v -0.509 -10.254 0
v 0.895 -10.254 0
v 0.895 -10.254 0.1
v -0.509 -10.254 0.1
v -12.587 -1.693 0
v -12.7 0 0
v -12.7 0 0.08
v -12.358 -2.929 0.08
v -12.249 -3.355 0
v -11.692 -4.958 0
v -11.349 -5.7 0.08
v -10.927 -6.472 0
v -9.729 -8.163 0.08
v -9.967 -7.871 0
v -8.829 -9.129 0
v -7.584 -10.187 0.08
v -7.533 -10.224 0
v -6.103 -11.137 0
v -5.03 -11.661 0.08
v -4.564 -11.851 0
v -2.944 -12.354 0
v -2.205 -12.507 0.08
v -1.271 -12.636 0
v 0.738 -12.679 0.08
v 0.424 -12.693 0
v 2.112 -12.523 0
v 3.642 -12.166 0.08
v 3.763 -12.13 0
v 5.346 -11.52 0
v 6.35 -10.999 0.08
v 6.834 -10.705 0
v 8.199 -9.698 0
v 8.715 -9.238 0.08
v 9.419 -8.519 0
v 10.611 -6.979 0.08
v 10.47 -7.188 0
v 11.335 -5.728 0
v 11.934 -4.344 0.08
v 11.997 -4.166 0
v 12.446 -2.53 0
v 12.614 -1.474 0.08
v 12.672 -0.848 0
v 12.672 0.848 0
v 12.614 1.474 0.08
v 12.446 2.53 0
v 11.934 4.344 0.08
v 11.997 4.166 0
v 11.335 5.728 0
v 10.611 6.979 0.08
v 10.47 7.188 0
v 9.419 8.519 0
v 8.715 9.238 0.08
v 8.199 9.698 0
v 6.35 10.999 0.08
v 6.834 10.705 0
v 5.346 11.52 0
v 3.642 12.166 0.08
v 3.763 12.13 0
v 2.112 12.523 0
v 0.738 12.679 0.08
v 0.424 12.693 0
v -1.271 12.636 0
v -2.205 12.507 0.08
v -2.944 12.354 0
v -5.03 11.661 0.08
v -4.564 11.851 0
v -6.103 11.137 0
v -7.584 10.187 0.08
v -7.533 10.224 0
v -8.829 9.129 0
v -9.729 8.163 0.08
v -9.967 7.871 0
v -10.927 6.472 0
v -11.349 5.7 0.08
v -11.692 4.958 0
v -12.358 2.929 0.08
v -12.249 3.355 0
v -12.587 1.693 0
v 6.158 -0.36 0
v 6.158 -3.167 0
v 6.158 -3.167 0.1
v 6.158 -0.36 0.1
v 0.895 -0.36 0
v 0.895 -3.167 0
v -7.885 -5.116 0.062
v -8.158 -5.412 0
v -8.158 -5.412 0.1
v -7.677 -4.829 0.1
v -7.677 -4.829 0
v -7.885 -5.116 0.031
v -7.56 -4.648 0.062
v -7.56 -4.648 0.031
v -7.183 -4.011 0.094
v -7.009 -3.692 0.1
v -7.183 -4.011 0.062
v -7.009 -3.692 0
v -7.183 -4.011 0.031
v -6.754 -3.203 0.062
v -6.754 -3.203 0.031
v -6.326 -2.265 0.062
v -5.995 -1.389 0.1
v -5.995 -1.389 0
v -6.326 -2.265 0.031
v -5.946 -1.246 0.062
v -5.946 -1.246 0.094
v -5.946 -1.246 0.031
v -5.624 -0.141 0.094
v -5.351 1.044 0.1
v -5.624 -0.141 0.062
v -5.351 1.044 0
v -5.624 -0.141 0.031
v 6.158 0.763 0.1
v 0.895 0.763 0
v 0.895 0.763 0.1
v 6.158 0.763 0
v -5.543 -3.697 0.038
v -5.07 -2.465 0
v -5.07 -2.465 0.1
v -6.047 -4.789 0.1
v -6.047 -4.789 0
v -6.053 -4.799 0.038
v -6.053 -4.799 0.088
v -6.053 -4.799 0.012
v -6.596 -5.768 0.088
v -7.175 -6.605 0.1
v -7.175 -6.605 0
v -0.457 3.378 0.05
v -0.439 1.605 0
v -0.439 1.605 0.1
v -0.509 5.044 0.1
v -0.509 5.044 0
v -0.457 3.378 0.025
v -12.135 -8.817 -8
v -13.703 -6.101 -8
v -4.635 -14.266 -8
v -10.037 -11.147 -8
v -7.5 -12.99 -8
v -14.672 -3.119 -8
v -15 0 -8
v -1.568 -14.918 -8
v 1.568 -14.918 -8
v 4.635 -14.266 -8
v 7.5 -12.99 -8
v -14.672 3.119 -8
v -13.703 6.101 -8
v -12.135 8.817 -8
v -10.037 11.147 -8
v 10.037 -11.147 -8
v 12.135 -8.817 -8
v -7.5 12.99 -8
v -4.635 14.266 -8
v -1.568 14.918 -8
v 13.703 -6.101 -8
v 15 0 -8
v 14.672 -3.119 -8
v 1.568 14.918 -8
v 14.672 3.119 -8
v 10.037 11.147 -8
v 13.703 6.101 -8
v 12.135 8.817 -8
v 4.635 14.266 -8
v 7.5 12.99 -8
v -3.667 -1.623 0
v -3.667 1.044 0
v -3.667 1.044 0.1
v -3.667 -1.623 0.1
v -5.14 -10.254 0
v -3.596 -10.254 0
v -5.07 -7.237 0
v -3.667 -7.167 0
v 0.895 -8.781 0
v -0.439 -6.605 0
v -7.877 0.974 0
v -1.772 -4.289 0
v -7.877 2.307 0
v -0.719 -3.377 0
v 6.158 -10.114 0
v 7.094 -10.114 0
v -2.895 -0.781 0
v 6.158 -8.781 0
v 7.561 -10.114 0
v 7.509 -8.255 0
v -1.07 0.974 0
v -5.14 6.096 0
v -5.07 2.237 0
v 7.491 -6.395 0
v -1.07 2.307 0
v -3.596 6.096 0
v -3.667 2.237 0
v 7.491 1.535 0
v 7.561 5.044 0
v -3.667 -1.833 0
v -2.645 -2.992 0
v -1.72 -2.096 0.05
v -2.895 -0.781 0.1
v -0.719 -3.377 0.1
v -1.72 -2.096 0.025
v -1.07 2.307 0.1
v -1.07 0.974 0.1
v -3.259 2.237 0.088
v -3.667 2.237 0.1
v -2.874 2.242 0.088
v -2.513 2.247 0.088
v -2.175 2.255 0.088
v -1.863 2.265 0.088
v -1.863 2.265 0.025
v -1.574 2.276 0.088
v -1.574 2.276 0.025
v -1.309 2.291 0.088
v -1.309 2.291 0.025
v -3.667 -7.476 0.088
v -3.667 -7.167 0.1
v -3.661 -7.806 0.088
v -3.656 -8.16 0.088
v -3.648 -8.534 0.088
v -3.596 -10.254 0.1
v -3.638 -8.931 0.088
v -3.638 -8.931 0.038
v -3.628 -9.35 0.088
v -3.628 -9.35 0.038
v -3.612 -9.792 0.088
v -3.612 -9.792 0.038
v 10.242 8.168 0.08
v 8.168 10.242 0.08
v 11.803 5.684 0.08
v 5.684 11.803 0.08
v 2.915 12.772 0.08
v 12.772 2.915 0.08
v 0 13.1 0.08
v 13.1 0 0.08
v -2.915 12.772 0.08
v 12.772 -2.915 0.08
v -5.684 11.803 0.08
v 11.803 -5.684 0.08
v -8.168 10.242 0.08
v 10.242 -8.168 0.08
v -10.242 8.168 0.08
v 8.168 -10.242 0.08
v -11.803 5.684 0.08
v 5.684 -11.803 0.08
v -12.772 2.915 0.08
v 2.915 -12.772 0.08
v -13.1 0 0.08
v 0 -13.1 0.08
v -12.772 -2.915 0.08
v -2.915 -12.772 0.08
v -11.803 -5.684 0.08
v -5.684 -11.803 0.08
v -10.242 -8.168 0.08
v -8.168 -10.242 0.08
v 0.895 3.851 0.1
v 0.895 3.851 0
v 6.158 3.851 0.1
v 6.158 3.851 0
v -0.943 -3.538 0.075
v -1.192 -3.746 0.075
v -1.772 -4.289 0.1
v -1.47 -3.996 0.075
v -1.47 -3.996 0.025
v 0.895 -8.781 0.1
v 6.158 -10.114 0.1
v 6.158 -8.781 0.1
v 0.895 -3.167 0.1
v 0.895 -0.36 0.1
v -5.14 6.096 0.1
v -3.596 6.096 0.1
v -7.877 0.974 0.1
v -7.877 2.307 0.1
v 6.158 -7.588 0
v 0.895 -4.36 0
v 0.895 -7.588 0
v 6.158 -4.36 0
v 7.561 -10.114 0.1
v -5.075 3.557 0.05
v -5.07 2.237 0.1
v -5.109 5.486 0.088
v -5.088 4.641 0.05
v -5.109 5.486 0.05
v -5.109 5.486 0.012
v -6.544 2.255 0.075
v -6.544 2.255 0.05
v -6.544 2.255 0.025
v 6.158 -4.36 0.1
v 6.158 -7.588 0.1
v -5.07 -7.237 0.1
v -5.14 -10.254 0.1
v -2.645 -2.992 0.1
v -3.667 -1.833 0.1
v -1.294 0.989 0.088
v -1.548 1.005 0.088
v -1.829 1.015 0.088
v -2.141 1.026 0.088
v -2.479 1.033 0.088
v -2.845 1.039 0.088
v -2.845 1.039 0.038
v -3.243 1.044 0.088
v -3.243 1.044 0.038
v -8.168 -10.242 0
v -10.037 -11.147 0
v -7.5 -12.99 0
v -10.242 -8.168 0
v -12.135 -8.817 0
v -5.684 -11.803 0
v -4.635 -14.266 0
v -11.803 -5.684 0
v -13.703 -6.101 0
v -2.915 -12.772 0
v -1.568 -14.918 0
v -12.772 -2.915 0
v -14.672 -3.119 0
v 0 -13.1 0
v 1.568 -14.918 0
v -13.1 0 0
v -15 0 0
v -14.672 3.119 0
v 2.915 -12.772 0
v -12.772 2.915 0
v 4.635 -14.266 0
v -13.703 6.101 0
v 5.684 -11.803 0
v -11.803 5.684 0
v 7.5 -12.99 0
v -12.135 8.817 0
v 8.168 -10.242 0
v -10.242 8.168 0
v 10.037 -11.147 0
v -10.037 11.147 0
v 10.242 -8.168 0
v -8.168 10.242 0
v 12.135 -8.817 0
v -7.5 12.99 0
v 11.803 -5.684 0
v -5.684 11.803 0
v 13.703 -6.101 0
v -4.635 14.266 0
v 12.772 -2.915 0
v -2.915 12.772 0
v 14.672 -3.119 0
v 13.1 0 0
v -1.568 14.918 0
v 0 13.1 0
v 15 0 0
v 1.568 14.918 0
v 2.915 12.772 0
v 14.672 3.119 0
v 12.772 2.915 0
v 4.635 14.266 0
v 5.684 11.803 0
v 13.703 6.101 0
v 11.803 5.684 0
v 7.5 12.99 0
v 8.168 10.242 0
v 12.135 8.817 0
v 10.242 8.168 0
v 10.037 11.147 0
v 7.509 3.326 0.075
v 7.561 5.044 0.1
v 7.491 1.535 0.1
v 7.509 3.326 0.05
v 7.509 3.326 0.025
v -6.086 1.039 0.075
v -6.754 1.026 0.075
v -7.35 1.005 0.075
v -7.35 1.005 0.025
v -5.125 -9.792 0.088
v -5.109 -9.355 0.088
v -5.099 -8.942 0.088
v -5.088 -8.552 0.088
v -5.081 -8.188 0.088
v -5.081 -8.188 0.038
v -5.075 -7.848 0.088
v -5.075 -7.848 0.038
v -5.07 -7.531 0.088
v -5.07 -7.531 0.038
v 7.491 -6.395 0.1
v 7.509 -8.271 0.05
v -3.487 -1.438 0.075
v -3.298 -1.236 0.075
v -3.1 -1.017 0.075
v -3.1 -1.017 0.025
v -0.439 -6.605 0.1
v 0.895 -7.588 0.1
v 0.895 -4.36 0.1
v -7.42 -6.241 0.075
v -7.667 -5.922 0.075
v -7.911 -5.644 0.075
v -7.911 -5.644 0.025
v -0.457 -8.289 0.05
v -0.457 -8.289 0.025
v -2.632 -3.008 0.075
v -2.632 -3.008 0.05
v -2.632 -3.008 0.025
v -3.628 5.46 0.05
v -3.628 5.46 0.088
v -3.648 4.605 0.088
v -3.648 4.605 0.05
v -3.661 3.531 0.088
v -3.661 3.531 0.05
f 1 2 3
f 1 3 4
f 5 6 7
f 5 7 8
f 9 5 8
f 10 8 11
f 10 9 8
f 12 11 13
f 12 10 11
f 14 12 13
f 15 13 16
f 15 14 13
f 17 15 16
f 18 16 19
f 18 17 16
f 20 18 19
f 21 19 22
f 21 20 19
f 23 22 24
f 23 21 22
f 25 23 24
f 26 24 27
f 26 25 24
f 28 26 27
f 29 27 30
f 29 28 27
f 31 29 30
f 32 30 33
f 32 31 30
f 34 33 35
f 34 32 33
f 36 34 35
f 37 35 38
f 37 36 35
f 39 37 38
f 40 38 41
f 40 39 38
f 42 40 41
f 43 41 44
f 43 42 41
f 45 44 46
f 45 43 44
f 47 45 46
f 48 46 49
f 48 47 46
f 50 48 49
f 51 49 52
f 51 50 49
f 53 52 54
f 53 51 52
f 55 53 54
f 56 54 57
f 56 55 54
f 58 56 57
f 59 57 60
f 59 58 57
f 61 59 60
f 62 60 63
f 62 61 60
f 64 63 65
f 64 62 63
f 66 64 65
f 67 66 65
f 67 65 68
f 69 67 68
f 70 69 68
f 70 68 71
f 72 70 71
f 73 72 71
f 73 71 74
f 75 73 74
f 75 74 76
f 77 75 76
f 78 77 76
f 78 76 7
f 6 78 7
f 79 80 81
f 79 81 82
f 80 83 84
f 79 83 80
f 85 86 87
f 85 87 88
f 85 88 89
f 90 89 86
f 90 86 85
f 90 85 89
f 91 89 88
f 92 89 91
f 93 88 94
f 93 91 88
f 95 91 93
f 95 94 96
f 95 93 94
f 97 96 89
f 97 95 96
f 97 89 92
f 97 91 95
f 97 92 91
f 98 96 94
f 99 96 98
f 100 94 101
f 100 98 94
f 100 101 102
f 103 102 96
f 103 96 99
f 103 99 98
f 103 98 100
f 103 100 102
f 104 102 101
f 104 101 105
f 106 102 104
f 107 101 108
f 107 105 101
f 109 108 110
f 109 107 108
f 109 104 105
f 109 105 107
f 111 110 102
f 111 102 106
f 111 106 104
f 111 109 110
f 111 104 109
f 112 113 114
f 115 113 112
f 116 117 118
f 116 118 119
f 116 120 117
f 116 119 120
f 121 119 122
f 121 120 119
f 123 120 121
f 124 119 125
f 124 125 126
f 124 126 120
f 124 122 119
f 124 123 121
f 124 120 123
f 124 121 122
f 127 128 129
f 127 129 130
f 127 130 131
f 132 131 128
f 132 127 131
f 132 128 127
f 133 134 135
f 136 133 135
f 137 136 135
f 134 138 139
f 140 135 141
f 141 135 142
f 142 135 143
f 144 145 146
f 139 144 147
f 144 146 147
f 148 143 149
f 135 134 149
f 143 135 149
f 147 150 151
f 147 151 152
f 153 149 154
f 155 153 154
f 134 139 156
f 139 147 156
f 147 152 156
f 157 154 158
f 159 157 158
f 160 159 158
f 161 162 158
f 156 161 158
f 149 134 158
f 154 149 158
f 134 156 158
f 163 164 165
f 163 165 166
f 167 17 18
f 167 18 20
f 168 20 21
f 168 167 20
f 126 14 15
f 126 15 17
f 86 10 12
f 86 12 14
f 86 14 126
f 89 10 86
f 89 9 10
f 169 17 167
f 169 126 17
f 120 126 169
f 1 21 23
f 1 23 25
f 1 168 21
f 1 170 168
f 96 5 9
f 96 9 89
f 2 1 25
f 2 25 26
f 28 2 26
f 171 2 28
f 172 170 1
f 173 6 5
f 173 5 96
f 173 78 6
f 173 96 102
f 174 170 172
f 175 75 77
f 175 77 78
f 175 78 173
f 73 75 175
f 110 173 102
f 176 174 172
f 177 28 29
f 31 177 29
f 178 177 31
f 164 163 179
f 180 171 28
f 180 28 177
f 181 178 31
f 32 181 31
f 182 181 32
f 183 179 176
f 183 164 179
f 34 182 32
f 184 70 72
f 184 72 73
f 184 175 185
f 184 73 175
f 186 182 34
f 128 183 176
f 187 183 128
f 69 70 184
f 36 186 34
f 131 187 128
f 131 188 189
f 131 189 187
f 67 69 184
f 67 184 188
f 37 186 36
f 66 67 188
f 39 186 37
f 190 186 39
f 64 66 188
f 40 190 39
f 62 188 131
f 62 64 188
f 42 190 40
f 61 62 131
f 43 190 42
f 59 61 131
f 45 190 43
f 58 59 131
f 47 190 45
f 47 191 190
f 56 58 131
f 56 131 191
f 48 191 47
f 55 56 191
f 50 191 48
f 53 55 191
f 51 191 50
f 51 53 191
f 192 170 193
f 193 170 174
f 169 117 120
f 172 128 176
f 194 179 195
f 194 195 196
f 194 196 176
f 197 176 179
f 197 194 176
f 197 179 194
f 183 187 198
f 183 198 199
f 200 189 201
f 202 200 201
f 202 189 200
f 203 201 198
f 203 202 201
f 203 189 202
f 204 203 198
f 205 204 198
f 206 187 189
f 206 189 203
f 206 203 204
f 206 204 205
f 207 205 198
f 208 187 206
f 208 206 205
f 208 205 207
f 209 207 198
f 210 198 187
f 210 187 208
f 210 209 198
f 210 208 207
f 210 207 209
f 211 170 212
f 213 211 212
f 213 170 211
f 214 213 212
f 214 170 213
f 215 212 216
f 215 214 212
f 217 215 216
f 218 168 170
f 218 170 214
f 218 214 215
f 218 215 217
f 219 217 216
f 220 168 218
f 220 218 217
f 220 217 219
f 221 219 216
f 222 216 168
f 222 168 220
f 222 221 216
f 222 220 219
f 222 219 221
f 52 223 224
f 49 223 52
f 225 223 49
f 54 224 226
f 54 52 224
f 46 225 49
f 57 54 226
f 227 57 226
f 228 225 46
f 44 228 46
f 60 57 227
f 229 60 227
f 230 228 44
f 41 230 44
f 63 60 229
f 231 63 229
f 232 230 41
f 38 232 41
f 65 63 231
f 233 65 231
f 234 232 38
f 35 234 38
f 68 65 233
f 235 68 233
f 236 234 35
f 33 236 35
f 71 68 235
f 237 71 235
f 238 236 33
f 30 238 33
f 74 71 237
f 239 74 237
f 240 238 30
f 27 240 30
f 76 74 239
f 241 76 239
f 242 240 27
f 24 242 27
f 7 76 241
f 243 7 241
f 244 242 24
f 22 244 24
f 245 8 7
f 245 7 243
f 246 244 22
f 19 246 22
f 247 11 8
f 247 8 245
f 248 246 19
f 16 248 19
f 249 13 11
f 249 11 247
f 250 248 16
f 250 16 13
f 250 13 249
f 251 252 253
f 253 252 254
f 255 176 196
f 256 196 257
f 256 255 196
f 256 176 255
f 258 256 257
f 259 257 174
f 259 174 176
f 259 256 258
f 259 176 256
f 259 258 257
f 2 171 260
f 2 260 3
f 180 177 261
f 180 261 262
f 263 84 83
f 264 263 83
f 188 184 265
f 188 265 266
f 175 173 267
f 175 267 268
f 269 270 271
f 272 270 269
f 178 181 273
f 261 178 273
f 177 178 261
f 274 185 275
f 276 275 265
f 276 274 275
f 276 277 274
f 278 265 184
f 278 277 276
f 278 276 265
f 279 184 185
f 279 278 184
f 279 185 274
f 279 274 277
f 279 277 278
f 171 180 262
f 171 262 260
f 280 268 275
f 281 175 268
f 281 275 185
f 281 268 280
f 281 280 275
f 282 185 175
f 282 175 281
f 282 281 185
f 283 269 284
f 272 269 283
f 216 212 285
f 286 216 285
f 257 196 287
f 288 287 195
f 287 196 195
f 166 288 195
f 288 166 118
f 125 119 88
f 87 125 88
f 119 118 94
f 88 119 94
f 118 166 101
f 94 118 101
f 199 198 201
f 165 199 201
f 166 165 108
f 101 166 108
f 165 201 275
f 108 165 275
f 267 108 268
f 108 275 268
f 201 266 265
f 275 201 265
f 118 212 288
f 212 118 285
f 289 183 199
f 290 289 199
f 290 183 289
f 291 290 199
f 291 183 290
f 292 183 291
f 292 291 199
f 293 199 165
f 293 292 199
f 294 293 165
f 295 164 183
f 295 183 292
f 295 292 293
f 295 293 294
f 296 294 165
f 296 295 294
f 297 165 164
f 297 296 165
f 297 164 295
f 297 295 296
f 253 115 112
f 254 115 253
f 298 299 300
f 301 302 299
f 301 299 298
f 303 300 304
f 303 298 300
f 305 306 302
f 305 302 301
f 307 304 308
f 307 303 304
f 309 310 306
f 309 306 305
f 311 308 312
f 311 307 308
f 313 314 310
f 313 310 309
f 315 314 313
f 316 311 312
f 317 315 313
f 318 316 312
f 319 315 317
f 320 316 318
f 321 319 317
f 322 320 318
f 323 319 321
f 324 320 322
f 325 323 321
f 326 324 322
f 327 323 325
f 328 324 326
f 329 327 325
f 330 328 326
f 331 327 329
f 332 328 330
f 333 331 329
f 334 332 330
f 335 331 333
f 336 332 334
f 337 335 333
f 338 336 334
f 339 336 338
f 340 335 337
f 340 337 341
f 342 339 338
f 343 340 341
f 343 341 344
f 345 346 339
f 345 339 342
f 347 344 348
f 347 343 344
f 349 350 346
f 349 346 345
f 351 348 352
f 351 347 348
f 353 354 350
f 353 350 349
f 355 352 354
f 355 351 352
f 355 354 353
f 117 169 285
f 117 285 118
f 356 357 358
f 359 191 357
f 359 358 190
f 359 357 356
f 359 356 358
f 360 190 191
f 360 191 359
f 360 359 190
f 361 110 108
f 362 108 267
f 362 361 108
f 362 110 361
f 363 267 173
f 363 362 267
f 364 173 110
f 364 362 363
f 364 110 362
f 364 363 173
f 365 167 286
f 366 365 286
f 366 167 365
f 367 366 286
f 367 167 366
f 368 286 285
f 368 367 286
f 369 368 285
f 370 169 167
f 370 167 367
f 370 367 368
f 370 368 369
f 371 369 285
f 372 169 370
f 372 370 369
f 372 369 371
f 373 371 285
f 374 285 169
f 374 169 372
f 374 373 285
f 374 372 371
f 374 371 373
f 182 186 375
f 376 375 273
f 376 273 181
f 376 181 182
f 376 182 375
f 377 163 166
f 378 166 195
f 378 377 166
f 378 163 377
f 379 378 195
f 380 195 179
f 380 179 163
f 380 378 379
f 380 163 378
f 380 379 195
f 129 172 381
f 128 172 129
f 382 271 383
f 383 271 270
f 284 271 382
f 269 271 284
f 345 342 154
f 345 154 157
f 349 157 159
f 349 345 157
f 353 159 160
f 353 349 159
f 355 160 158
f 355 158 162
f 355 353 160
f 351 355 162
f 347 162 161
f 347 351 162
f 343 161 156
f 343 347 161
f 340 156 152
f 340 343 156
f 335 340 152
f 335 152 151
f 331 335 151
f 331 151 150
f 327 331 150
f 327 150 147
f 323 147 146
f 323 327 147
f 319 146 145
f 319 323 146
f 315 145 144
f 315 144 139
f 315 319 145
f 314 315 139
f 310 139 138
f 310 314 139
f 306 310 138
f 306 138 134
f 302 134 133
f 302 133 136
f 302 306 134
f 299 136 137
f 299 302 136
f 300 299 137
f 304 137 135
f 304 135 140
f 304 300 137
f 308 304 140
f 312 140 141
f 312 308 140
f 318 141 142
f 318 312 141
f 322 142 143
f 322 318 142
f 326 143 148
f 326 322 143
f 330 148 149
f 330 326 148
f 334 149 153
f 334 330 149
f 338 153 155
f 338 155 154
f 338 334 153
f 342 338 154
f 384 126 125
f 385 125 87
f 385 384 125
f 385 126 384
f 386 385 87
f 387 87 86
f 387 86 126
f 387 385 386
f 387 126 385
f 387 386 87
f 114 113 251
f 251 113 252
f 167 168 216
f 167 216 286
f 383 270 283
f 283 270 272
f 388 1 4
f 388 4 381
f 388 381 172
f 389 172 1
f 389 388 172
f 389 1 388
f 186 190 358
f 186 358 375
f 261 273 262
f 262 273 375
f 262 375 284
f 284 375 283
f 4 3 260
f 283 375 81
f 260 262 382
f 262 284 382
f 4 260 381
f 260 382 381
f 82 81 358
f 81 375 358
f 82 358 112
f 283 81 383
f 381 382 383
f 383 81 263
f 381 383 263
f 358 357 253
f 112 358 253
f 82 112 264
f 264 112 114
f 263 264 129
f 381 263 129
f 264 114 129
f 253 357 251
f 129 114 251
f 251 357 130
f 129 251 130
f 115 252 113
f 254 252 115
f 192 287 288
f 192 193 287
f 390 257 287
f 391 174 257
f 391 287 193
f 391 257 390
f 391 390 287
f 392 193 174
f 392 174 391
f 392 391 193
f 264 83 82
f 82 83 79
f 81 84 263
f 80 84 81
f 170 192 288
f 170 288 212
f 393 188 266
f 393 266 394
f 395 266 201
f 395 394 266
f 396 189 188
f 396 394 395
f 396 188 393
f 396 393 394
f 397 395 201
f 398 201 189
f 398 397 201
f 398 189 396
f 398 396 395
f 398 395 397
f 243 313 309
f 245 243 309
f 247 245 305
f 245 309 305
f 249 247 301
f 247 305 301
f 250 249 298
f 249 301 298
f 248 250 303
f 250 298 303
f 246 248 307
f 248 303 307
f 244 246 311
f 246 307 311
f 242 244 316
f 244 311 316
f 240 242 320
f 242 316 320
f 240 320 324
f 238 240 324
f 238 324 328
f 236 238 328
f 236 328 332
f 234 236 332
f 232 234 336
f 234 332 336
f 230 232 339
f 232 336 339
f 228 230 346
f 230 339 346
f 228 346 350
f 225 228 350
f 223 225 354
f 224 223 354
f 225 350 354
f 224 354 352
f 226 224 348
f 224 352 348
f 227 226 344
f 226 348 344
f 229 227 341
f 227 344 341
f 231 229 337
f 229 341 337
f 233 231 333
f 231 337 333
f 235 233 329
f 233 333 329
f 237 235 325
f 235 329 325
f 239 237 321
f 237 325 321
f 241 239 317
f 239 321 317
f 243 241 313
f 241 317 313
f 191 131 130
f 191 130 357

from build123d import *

# Parameters (mm, degrees)
SKETCH_1_R               = 15
DIAMETER30_HEIGHT8_DEPTH = 8
SKETCH_2_W               = 5.263157895
SKETCH_2_H               = 3.228070175
SKETCH_2_H_2             = 3.087719298
SKETCH_2_H_3             = 2.807017544
CHARACTER_DEPTH          = 0.1
SKETCH_3_R               = 13.1
SKETCH_3_R_2             = 12.7
INK_RING_DEPTH           = 0.08


with BuildPart() as part:
    # 草图1 → Diameter30_Height8 (new body)
    with BuildSketch(Plane.XY):
        Circle(SKETCH_1_R)
    extrude(amount=-DIAMETER30_HEIGHT8_DEPTH)

    # 草图2 → Character_相 (add)
    # profile 1 of 2: a face of its own
    with BuildSketch(Plane.XY):
        with BuildLine():
            add(Edge.make_bspline(
                [(7.561403509, 5.043859649), (7.55019112, 4.760584697), (7.527530744, 4.188082503), (7.508340227, 3.319863454), (7.49462205, 2.433550242), (7.492367, 1.83658782), (7.49122807, 1.535087719)],
                knots=[0, 0, 0, 0, 0.969283805, 1.958934606, 2.969145462, 4, 4, 4, 4], degree=3))
            Line((7.49122807, 1.535087719), (7.49122807, -6.394736842))
            add(Edge.make_bspline(
                [(7.49122807, -6.394736842), (7.494373274, -7.020306568), (7.500608133, -8.260397781), (7.541259106, -9.499836795), (7.561403509, -10.114035088)],
                knots=[0, 0, 0, 0, 1.008909215, 2, 2, 2, 2], degree=3))
            Line((7.561403509, -10.114035088), (6.157894737, -10.114035088))
            Line((6.157894737, -10.114035088), (6.157894737, -8.780701754))
            Line((6.157894737, -8.780701754), (0.894736842, -8.780701754))
            Line((0.894736842, -8.780701754), (0.894736842, -10.254385965))
            Line((0.894736842, -10.254385965), (-0.50877193, -10.254385965))
            add(Edge.make_bspline(
                [(-0.50877193, -10.254385965), (-0.497692205, -9.914790058), (-0.476326497, -9.259926631), (-0.456441705, -8.312053821), (-0.44245572, -7.435279895), (-0.439845263, -6.873840554), (-0.438596491, -6.605263158)],
                knots=[0, 0, 0, 0, 1.117081682, 2.154136505, 3.116988825, 4, 4, 4, 4], degree=3))
            Line((-0.438596491, -6.605263158), (-0.438596491, 1.605263158))
            add(Edge.make_bspline(
                [(-0.438596491, 1.605263158), (-0.439728026, 1.905030661), (-0.441958496, 2.495929231), (-0.45560045, 3.368382891), (-0.474798879, 4.214949159), (-0.497552487, 4.770115799), (-0.50877193, 5.043859649)],
                knots=[0, 0, 0, 0, 1.04583296, 2.06153501, 3.044173712, 4, 4, 4, 4], degree=3))
            Line((-0.50877193, 5.043859649), (7.561403509, 5.043859649))
        make_face()
        with Locations((3.52631579, -5.973684211)):
            Rectangle(SKETCH_2_W, SKETCH_2_H, mode=Mode.SUBTRACT)
        with Locations((3.52631579, 2.307017544)):
            Rectangle(SKETCH_2_W, SKETCH_2_H_2, mode=Mode.SUBTRACT)
        with Locations((3.52631579, -1.763157895)):
            Rectangle(SKETCH_2_W, SKETCH_2_H_3, mode=Mode.SUBTRACT)
    # profile 2 of 2: a face of its own
    with BuildSketch(Plane.XY):
        with BuildLine():
            add(Edge.make_bspline(
                [(-5.070175439, 2.236842105), (-5.069643134, 2.466430588), (-5.068622699, 2.906554508), (-5.075570455, 3.53725376), (-5.079714917, 4.10907054), (-5.087055031, 4.62111986), (-5.098673186, 5.0733128), (-5.106736303, 5.466792434), (-5.12325681, 5.801143721), (-5.135036136, 6.004664303), (-5.140350877, 6.096491228)],
                knots=[0, 0, 0, 0, 1.427178642, 2.735918853, 3.920795363, 4.981877593, 5.919216055, 6.732723881, 7.428214742, 8, 8, 8, 8], degree=3))
            Line((-5.140350877, 6.096491228), (-3.596491228, 6.096491228))
            add(Edge.make_bspline(
                [(-3.596491228, 6.096491228), (-3.601779492, 5.999464476), (-3.613344956, 5.787266417), (-3.630069425, 5.441663603), (-3.638095211, 5.041255673), (-3.649732329, 4.586464135), (-3.657106974, 4.077015184), (-3.661264203, 3.512129116), (-3.668208495, 2.892692888), (-3.667194182, 2.461232429), (-3.666666667, 2.236842105)],
                knots=[0, 0, 0, 0, 0.604055621, 1.321073082, 2.150740011, 3.093471638, 4.149178994, 5.317910599, 6.605121521, 8, 8, 8, 8], degree=3))
            add(Edge.make_bspline(
                [(-3.666666667, 2.236842105), (-3.530644111, 2.236328112), (-3.266384763, 2.235329545), (-2.88174296, 2.242348317), (-2.520442081, 2.246480446), (-2.183393026, 2.253960205), (-1.870707533, 2.265624871), (-1.582020196, 2.273807132), (-1.317912922, 2.290824228), (-1.149878443, 2.301807771), (-1.070175439, 2.307017544)],
                knots=[0, 0, 0, 0, 1.256536578, 2.441150545, 3.553740755, 4.59446206, 5.555405596, 6.444361595, 7.262121348, 8, 8, 8, 8], degree=3))
            Line((-1.070175439, 2.307017544), (-1.070175439, 0.973684211))
            add(Edge.make_bspline(
                [(-1.070175439, 0.973684211), (-1.144677854, 0.978928331), (-1.304031085, 0.990144981), (-1.556887974, 1.006935749), (-1.839513589, 1.015234756), (-2.149605268, 1.026721716), (-2.488385884, 1.034270902), (-2.855751381, 1.03840672), (-3.251657288, 1.045376401), (-3.525446035, 1.044375774), (-3.666666667, 1.043859649)],
                knots=[0, 0, 0, 0, 0.689951739, 1.475737907, 2.340680501, 3.301602752, 4.342301003, 5.470871417, 6.695471813, 8, 8, 8, 8], degree=3))
            Line((-3.666666667, 1.043859649), (-3.666666667, -1.622807018))
            add(Edge.make_bspline(
                [(-3.666666667, -1.622807018), (-3.606636203, -1.561535904), (-3.48182972, -1.434150045), (-3.293392102, -1.23182095), (-3.094864807, -1.013455465), (-2.962807273, -0.859869327), (-2.894736842, -0.780701754)],
                knots=[0, 0, 0, 0, 0.900819035, 1.872850031, 2.903538413, 4, 4, 4, 4], degree=3))
            add(Edge.make_bspline(
                [(-2.894736842, -0.780701754), (-2.689573637, -1.00021337), (-2.288105654, -1.429758644), (-1.724253911, -2.085214095), (-1.199061827, -2.727559357), (-0.877018772, -3.163628299), (-0.719298246, -3.377192982)],
                knots=[0, 0, 0, 0, 1.063555414, 2.081189198, 3.060262768, 4, 4, 4, 4], degree=3))
            add(Edge.make_bspline(
                [(-0.719298246, -3.377192982), (-0.794679109, -3.429771468), (-0.958911081, -3.544323996), (-1.205171009, -3.756414434), (-1.484543132, -4.003739185), (-1.672408418, -4.190524428), (-1.771929825, -4.289473684)],
                knots=[0, 0, 0, 0, 0.790186824, 1.721576733, 2.793008042, 4, 4, 4, 4], degree=3))
            add(Edge.make_bspline(
                [(-1.771929825, -4.289473684), (-1.904998341, -4.0700807), (-2.172035646, -3.629810433), (-2.627101337, -3.003052442), (-3.120200979, -2.3973547), (-3.483629338, -2.022250893), (-3.666666667, -1.833333333)],
                knots=[0, 0, 0, 0, 0.989574309, 1.98584356, 2.985588755, 4, 4, 4, 4], degree=3))
            Line((-3.666666667, -1.833333333), (-3.666666667, -7.166666667))
            add(Edge.make_bspline(
                [(-3.666666667, -7.166666667), (-3.66710265, -7.269767462), (-3.668003985, -7.48291384), (-3.66072287, -7.813831844), (-3.656774838, -8.166472041), (-3.648756785, -8.54161481), (-3.637317912, -8.938358747), (-3.628857904, -9.357787252), (-3.611274705, -9.798652569), (-3.601493913, -10.100167122), (-3.596491228, -10.254385965)],
                knots=[0, 0, 0, 0, 0.801096895, 1.65615505, 2.571793352, 3.541398262, 4.571731919, 5.655903347, 6.80104005, 8, 8, 8, 8], degree=3))
            Line((-3.596491228, -10.254385965), (-5.140350877, -10.254385965))
            add(Edge.make_bspline(
                [(-5.140350877, -10.254385965), (-5.135369022, -10.10016635), (-5.125684865, -9.80038102), (-5.107972861, -9.362986873), (-5.099566341, -8.949620037), (-5.088128806, -8.560674404), (-5.080093207, -8.195928707), (-5.076127742, -7.855416847), (-5.068855811, -7.538361954), (-5.069746959, -7.334744801), (-5.070175439, -7.236842105)],
                knots=[0, 0, 0, 0, 1.22682853, 2.384814657, 3.480414063, 4.514038807, 5.478633795, 6.38111711, 7.221612736, 8, 8, 8, 8], degree=3))
            Line((-5.070175439, -7.236842105), (-5.070175439, -2.464912281))
            add(Edge.make_bspline(
                [(-5.070175439, -2.464912281), (-5.145846519, -2.675980137), (-5.294332566, -3.090149346), (-5.536827031, -3.689408015), (-5.785768752, -4.257890313), (-6.045384746, -4.792645481), (-6.312844256, -5.294903161), (-6.587960306, -5.764116531), (-6.873615691, -6.199513832), (-7.076236773, -6.471903257), (-7.175438596, -6.605263158)],
                knots=[0, 0, 0, 0, 1.153721074, 2.263896326, 3.325849438, 4.34673122, 5.322030602, 6.253316748, 7.144836456, 8, 8, 8, 8], degree=3))
            add(Edge.make_bspline(
                [(-7.175438596, -6.605263158), (-7.255029914, -6.482647166), (-7.407975598, -6.247023641), (-7.657596365, -5.928969858), (-7.897823334, -5.645524257), (-8.073840549, -5.487664221), (-8.157894737, -5.412280702)],
                knots=[0, 0, 0, 0, 1.130515109, 2.172440566, 3.127278412, 4, 4, 4, 4], degree=3))
            add(Edge.make_bspline(
                [(-8.157894737, -5.412280702), (-8.113720781, -5.370641152), (-8.01581978, -5.278357058), (-7.875116797, -5.106371966), (-7.717691149, -4.894771662), (-7.55214221, -4.637411783), (-7.368626266, -4.340225536), (-7.17523642, -3.999537296), (-6.966943261, -3.616722912), (-6.748324508, -3.195711401), (-6.527564492, -2.742508267), (-6.321130463, -2.262276924), (-6.126625974, -1.76162537), (-5.940007338, -1.243020266), (-5.775804486, -0.699655792), (-5.619811727, -0.137450112), (-5.476041057, 0.445727539), (-5.392993233, 0.842595842), (-5.350877193, 1.043859649)],
                knots=[0, 0, 0, 0, 0.40920384, 0.906902363, 1.496106211, 2.188358286, 2.970301714, 3.852632424, 4.830874076, 5.910586812, 7.053030269, 8.231162496, 9.436019769, 10.676532886, 11.948579996, 13.264574909, 14.612783986, 16, 16, 16, 16], degree=3))
            add(Edge.make_bspline(
                [(-5.350877193, 1.043859649), (-5.59606702, 1.042803509), (-6.063956973, 1.040788102), (-6.730227869, 1.027390075), (-7.327421009, 1.009098406), (-7.701367224, 0.985010229), (-7.877192982, 0.973684211)],
                knots=[0, 0, 0, 0, 1.163979785, 2.221195127, 3.163623796, 4, 4, 4, 4], degree=3))
            Line((-7.877192982, 0.973684211), (-7.877192982, 2.307017544))
            add(Edge.make_bspline(
                [(-7.877192982, 2.307017544), (-7.660637158, 2.295769666), (-7.216421348, 2.272697163), (-6.531817674, 2.253723458), (-5.812703734, 2.240131437), (-5.321428092, 2.237955131), (-5.070175439, 2.236842105)],
                knots=[0, 0, 0, 0, 0.926596032, 1.900704393, 2.926359164, 4, 4, 4, 4], degree=3))
        make_face()
    extrude(amount=CHARACTER_DEPTH)

    # 草图3 → Ink_ring (add)
    with BuildSketch(Plane.XY):
        with Locations(Location((0, 0, 0), (0, 0, 180))):
            Circle(SKETCH_3_R)
        with Locations(Location((0, 0, 0), (0, 0, 180))):
            Circle(SKETCH_3_R_2, mode=Mode.SUBTRACT)
    extrude(amount=INK_RING_DEPTH)


solid = part.part
